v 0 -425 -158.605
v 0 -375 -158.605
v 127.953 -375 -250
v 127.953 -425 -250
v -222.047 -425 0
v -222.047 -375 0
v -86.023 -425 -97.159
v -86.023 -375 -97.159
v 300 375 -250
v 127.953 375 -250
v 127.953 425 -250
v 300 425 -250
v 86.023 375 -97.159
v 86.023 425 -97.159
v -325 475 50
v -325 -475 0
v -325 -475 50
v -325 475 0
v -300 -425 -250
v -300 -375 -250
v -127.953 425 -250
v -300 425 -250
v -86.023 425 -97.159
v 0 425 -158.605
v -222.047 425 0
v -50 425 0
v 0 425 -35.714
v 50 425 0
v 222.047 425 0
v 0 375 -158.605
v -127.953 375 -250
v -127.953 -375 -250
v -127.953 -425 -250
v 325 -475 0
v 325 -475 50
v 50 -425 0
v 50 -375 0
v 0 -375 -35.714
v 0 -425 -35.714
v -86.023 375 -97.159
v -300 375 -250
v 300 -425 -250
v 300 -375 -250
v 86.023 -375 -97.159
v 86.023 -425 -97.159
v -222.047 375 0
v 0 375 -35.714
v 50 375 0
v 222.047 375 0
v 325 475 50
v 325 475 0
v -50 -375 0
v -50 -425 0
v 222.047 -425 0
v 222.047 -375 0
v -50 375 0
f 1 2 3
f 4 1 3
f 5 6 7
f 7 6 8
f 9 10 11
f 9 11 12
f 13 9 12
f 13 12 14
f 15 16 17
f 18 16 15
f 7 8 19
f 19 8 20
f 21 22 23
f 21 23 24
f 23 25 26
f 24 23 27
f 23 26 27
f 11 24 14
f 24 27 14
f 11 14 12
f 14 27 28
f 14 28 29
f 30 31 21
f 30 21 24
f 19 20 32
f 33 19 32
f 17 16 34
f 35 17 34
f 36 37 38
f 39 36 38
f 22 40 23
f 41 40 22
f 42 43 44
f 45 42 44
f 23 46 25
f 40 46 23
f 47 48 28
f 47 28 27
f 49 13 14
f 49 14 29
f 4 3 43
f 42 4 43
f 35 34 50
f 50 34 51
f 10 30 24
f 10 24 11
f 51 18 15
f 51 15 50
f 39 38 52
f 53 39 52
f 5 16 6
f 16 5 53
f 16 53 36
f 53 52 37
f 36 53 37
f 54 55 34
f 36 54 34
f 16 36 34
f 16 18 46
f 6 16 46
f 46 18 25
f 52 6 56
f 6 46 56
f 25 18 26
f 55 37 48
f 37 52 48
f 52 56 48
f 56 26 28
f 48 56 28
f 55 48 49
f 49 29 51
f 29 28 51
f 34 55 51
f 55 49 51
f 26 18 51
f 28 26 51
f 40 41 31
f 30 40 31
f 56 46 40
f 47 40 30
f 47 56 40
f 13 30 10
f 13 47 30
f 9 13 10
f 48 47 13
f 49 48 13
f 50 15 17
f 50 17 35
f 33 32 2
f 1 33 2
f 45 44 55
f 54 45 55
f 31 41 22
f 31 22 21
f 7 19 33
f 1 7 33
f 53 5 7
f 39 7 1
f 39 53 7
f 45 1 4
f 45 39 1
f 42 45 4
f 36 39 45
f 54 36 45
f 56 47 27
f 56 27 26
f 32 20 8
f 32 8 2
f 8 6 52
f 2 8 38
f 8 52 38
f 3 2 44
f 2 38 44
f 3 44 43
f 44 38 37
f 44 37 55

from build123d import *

# Parameters (mm, degrees)
F0_W     = 650
F0_H     = 950
F1_DEPTH = 50
F4_DEPTH = 50


with BuildPart() as f1:
    # F0 (on Top) → F1 (new body)
    with BuildSketch(Plane.XY):
        Rectangle(F0_W, F0_H)
    extrude(amount=F1_DEPTH)

    # F3 (on offset) → F4 (join)
    with BuildSketch(Plane.XZ.offset(375)):
        Polygon((0, -158.604646672), (-86.0232526704, -97.1594661932), (-300, -250), (-127.9534946591, -250), align=None)
        Polygon((0, -35.7142857143), (-86.0232526704, -97.1594661932), (0, -158.604646672), (86.0232526704, -97.1594661932), align=None)
        Polygon((50, 0), (0, -35.7142857143), (86.0232526704, -97.1594661932), (222.0465053409, 0), align=None)
        Polygon((-50, 0), (-222.0465053409, 0), (-86.0232526704, -97.1594661932), (0, -35.7142857143), align=None)
        Polygon((86.0232526704, -97.1594661932), (0, -158.604646672), (127.9534946591, -250), (300, -250), align=None)
    extrude(amount=F4_DEPTH)

    # F5: F1 across plane


with BuildPart() as f1_1:
    add(f1.part)
    add(f1.part.mirror(Plane.XZ))


solid = f1_1.part
